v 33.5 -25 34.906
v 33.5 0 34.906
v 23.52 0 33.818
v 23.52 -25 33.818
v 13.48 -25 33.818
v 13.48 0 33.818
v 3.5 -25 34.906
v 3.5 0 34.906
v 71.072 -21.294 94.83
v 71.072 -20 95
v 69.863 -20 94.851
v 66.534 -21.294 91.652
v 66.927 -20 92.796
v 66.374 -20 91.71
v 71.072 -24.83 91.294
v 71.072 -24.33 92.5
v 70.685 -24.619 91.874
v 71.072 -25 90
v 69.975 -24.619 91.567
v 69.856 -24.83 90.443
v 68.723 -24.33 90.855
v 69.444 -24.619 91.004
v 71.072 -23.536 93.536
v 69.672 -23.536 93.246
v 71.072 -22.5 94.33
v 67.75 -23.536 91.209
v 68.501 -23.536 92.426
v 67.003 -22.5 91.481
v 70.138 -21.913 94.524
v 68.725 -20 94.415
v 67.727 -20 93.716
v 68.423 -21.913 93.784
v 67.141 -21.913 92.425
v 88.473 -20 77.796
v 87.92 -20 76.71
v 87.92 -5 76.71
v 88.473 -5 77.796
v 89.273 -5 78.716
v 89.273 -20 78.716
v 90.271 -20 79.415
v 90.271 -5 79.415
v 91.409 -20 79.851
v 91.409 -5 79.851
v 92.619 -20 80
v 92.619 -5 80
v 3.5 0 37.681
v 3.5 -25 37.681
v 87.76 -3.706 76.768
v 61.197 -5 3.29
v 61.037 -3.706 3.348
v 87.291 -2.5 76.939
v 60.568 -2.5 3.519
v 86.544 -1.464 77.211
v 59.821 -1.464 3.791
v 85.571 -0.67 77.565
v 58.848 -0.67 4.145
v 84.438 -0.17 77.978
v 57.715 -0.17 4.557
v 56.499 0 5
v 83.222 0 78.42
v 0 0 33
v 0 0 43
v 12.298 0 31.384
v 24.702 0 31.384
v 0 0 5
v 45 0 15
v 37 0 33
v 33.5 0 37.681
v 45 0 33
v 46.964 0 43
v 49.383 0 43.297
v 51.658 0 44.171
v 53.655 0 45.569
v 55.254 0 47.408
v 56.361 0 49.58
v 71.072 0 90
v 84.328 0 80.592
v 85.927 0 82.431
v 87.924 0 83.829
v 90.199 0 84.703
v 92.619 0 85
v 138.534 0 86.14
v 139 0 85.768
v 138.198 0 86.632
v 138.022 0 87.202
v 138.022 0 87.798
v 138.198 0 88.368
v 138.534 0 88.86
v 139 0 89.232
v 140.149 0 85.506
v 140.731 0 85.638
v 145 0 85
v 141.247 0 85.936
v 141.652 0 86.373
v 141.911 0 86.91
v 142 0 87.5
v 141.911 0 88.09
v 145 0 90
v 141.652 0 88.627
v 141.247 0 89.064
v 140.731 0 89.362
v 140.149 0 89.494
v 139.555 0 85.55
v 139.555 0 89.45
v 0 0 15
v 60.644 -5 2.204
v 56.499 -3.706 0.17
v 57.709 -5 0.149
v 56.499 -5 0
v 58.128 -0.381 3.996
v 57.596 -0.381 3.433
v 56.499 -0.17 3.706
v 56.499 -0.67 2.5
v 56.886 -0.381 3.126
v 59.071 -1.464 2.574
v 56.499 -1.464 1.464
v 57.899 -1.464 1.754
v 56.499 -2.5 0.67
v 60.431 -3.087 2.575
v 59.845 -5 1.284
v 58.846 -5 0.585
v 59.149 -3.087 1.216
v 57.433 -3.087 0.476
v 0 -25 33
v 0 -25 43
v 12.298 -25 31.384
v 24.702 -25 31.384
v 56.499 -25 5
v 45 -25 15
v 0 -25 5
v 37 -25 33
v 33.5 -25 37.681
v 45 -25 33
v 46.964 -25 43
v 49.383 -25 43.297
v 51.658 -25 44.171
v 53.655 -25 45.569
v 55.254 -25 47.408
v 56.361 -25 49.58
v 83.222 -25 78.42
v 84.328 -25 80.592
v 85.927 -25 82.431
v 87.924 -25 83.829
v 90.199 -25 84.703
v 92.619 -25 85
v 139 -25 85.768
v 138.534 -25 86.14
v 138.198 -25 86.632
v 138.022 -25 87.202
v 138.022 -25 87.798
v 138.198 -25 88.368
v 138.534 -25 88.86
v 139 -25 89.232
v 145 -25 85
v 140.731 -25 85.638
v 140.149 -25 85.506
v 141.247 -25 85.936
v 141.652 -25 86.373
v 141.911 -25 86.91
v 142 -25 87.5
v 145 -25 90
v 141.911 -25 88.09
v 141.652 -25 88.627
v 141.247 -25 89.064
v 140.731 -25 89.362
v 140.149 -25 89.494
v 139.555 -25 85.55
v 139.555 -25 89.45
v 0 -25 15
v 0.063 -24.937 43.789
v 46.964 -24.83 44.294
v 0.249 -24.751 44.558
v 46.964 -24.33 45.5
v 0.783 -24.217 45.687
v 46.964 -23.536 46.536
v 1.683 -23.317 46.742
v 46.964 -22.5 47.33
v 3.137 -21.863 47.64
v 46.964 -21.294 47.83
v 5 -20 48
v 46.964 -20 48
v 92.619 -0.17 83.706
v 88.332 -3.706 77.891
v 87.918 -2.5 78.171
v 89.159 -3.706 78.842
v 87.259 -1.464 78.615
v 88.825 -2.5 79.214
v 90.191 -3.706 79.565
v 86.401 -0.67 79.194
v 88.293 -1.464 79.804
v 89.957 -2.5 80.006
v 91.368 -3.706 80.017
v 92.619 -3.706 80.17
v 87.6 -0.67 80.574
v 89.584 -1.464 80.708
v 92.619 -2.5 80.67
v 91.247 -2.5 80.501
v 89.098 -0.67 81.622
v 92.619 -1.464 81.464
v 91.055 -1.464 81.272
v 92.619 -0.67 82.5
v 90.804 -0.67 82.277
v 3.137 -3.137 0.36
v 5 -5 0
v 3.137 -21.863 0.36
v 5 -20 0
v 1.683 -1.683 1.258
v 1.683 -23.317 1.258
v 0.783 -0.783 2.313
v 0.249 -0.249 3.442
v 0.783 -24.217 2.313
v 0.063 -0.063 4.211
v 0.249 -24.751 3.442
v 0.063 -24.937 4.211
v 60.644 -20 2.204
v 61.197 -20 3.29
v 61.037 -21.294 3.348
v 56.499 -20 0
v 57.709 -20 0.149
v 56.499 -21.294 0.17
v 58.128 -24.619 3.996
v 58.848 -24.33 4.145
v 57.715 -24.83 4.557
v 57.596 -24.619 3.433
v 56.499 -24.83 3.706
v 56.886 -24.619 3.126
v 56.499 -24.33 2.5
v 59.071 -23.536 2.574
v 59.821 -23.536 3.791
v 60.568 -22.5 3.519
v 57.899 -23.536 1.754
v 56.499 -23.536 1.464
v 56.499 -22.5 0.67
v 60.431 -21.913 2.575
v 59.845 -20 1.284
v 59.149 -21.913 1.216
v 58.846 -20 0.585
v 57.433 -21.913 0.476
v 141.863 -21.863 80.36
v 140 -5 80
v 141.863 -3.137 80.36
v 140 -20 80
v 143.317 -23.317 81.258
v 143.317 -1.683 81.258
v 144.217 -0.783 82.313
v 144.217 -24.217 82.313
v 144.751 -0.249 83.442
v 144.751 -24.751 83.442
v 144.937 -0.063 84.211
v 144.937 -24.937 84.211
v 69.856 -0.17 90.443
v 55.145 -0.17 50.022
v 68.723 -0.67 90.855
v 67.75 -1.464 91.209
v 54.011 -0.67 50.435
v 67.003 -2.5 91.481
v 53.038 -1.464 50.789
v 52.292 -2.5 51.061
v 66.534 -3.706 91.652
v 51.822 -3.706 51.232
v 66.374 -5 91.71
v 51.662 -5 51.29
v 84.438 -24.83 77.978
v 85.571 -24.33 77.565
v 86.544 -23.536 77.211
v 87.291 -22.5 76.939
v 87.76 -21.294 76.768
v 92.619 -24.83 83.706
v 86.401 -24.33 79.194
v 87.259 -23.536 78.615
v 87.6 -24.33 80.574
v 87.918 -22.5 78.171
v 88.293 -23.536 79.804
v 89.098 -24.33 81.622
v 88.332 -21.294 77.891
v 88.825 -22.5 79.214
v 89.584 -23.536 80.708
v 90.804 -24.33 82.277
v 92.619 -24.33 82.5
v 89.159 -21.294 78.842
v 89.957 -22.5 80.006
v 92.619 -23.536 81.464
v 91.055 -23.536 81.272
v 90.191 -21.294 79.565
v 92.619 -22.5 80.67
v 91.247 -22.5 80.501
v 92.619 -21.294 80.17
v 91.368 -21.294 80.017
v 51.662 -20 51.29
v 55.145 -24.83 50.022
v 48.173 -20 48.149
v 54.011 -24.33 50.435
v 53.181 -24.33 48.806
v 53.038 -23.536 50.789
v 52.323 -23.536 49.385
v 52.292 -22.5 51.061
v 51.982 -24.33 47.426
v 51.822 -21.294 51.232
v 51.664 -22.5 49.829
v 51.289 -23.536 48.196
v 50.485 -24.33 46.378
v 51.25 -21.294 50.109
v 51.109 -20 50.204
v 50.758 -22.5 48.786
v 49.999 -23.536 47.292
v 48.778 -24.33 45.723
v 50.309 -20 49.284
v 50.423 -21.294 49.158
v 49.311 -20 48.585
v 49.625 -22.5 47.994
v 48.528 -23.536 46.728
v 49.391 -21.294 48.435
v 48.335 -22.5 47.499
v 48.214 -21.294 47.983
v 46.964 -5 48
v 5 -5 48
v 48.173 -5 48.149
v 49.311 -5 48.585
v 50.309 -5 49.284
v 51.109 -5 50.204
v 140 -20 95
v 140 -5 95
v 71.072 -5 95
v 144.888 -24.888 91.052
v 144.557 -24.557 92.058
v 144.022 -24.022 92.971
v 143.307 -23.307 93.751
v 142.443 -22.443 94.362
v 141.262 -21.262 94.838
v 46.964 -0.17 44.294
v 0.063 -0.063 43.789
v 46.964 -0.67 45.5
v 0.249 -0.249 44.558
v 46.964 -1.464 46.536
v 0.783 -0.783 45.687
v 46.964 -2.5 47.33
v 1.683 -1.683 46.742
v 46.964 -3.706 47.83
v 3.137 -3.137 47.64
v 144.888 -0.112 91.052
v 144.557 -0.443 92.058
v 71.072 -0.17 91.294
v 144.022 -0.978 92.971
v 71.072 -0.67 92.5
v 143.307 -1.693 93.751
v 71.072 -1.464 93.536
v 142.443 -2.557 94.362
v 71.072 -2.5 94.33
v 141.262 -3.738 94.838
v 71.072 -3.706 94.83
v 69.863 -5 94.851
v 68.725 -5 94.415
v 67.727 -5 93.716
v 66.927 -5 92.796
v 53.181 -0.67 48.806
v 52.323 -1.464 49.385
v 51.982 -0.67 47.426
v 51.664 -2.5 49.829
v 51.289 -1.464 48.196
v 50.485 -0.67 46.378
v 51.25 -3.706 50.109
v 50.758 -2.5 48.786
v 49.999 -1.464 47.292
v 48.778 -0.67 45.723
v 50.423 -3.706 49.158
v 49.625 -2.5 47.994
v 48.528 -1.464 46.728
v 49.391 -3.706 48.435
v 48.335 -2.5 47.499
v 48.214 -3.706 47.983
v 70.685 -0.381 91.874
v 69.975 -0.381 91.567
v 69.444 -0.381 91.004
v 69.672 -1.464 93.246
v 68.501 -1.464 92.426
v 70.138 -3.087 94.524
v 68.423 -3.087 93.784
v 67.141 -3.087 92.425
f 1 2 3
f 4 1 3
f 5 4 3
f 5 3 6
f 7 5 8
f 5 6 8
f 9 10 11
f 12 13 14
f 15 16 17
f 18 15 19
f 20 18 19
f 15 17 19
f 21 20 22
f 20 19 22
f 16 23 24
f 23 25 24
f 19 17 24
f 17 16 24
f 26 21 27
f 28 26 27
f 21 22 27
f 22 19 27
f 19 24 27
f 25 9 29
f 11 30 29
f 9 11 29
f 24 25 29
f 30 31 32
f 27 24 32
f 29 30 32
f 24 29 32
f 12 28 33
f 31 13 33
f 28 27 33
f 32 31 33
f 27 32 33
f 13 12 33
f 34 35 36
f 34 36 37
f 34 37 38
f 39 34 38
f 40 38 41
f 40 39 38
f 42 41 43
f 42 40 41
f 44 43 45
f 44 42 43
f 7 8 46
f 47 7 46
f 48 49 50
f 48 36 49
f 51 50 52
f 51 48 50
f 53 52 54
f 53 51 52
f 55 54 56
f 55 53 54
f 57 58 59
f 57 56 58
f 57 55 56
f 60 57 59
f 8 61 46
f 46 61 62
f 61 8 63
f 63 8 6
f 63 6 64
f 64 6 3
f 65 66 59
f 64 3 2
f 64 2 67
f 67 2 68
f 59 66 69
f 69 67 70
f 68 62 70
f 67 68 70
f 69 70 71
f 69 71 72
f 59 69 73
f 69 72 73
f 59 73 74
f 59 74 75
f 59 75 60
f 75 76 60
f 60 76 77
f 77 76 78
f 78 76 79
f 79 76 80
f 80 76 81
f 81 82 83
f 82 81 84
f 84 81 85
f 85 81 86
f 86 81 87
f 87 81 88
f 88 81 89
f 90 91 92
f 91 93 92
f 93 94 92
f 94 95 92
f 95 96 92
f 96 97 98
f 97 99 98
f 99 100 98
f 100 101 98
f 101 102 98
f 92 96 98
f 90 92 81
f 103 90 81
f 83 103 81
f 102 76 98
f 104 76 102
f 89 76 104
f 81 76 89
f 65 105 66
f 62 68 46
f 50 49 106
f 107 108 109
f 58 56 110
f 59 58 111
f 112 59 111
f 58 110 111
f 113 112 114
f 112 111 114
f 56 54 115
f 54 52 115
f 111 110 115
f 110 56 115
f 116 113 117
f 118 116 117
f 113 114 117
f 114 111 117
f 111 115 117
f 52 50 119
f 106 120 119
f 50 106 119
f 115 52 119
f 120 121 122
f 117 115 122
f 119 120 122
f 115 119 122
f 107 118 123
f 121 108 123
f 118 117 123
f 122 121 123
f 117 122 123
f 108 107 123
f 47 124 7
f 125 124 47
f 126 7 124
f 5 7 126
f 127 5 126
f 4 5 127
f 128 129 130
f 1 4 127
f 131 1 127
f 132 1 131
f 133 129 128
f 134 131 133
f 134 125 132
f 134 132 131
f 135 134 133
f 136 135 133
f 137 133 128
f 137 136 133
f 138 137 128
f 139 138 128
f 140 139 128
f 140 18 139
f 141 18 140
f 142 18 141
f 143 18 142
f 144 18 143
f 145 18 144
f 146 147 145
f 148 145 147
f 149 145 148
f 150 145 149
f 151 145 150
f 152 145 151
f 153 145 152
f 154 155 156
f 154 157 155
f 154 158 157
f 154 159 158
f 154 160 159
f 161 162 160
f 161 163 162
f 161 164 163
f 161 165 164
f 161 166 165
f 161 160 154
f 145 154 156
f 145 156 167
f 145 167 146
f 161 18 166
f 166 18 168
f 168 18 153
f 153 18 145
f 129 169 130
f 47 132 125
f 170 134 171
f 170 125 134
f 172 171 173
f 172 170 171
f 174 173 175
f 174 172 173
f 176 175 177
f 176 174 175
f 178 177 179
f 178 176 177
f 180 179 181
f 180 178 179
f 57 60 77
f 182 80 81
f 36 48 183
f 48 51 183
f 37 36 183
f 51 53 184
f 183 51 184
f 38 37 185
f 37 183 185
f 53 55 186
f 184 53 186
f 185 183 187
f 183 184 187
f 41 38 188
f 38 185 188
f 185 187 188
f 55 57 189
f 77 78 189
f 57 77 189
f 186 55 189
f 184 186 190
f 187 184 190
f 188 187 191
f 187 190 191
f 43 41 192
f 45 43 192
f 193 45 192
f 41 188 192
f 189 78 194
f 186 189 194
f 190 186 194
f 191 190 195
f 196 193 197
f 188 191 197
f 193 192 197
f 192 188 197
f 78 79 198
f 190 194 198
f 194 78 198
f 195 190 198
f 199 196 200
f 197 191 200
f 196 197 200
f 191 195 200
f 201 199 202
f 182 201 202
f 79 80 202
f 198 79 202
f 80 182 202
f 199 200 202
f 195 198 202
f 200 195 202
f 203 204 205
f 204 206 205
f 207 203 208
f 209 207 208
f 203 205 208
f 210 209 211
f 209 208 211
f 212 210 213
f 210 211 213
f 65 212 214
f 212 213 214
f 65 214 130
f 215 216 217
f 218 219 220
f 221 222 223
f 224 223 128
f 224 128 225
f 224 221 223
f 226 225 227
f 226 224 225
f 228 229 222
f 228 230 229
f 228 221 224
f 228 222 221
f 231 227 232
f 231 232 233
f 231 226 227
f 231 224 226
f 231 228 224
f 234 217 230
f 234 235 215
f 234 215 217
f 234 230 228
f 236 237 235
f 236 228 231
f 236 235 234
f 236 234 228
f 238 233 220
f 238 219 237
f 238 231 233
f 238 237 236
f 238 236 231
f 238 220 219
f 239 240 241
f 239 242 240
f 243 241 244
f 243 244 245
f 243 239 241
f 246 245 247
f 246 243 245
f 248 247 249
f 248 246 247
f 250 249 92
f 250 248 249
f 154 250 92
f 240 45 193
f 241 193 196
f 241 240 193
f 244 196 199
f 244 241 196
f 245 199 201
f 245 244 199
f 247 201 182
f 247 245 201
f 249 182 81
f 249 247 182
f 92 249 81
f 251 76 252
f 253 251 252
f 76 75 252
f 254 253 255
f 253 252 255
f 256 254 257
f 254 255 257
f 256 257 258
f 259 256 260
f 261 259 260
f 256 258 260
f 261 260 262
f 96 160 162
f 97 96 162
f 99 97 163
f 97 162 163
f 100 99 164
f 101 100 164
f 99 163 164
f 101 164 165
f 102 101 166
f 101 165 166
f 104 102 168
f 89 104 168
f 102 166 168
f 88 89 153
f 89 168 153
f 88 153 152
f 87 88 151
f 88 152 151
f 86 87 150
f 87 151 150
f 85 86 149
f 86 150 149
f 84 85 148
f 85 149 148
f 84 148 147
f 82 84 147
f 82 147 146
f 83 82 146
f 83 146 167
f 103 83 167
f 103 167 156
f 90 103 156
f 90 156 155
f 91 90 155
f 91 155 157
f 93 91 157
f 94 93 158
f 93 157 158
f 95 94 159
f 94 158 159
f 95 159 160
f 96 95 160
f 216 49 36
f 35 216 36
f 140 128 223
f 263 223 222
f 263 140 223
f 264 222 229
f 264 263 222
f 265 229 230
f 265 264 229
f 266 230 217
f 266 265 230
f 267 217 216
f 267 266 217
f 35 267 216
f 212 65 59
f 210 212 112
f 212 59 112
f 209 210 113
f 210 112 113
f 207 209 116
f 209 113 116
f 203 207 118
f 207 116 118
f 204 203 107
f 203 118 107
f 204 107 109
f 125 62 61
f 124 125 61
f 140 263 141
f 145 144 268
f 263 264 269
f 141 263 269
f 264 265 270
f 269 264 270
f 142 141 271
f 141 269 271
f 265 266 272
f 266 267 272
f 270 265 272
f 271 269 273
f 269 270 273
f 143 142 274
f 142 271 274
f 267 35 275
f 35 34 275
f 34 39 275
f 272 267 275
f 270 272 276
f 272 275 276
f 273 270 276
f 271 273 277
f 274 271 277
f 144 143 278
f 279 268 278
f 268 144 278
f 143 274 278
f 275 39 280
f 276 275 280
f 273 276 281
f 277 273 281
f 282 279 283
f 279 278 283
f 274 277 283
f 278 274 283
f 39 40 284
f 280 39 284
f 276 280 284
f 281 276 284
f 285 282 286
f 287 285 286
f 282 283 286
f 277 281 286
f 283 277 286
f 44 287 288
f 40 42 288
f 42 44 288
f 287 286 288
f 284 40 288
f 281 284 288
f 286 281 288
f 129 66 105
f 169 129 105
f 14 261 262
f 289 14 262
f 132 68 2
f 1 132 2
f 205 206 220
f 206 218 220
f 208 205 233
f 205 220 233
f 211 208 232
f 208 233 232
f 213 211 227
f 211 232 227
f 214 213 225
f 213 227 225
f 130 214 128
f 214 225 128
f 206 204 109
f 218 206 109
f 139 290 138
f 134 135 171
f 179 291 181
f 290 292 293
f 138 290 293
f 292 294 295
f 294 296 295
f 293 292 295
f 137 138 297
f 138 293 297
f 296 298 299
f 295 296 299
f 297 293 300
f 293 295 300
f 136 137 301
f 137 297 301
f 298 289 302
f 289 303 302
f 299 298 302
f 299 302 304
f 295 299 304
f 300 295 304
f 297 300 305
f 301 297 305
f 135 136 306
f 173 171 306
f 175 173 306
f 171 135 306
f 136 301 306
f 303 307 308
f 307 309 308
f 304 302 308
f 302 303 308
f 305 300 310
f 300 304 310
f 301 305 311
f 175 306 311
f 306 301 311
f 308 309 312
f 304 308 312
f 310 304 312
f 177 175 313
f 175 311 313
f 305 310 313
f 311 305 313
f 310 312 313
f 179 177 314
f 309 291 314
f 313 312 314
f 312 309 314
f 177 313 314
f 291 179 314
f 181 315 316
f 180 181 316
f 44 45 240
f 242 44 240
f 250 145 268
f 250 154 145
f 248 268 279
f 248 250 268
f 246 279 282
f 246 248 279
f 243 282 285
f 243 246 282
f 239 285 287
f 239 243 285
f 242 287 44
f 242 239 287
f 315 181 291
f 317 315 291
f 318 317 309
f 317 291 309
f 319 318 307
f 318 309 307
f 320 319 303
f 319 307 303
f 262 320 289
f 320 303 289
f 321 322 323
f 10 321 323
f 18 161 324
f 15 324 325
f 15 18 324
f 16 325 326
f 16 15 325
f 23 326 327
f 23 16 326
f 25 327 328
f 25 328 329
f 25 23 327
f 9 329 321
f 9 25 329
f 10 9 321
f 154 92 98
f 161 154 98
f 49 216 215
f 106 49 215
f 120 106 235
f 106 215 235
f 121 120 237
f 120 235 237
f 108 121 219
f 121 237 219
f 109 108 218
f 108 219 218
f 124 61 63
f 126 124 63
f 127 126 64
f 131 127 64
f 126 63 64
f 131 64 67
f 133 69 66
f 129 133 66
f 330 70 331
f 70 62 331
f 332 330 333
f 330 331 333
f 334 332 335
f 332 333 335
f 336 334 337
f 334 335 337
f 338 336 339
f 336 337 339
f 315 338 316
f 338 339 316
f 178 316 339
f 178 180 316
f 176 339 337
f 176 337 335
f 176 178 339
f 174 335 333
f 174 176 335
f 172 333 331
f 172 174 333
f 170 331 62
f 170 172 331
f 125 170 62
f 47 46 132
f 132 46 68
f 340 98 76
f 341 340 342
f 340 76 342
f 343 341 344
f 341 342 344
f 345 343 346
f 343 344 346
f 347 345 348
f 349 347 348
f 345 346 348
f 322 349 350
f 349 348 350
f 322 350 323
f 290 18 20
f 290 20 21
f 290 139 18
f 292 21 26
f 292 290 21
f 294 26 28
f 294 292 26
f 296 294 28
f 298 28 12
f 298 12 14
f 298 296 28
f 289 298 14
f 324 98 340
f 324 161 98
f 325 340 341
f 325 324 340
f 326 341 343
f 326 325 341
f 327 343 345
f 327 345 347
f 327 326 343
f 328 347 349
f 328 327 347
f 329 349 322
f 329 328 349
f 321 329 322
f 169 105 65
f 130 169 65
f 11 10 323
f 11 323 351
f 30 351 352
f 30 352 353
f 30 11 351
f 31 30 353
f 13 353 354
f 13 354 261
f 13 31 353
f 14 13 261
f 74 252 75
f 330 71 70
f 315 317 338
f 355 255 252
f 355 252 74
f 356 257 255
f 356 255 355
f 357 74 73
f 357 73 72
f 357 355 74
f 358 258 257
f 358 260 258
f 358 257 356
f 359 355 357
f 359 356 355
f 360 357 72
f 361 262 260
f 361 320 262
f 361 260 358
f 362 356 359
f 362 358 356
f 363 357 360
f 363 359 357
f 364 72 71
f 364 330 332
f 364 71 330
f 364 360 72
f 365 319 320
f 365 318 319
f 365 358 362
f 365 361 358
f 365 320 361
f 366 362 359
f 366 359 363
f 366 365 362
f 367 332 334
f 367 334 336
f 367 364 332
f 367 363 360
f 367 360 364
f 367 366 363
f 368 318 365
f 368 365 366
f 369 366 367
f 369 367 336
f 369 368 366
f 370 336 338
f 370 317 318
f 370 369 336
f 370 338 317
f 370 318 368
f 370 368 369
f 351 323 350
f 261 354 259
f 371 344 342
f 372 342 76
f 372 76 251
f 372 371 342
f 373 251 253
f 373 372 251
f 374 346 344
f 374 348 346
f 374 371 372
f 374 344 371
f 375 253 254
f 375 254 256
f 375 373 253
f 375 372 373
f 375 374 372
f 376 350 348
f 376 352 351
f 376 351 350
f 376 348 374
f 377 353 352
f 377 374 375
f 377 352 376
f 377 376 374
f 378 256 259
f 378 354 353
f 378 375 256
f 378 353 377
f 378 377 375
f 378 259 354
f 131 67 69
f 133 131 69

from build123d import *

# Parameters (mm, degrees)
F1_DEPTH = 25
F2_F1_R  = 5
F2_F2_R  = 5
F3_R     = 2
F4_DEPTH = 25


with BuildPart() as f1:
    # F0 (on Front) → F1 (new body)
    with BuildSketch(Plane.XZ):
        with BuildLine():
            Line((45, 15), (0, 15))
            Line((0, 15), (0, 0))
            Line((0, 0), (60, 0))
            Line((60, 0), (89.1176187413, 80))
            Line((89.1176187413, 80), (145, 80))
            Line((145, 80), (145, 95))
            Line((145, 95), (67.5712870168, 95))
            Line((67.5712870168, 95), (50.4646860063, 48))
            Line((50.4646860063, 48), (0, 48))
            Line((0, 48), (0, 33))
            ThreePointArc((0, 33), (18.5, 31.181274943), (37, 33))
            Line((37, 33), (45, 33))
            Line((45, 33), (45, 15))
        make_face()
        with BuildLine():
            ThreePointArc((33.5, 34.9055936253), (18.5, 33.681274943), (3.5, 34.9055936253))
            Line((3.5, 34.9055936253), (3.5, 37.681274943))
            Line((3.5, 37.681274943), (33.5, 37.681274943))
            Line((33.5, 37.681274943), (33.5, 34.9055936253))
        make_face(mode=Mode.SUBTRACT)
    extrude(amount=F1_DEPTH)

    # F2: fillet of radius 5 on 16 edges, made by hand

    # F2_f1
    f2_f1_edges = [f1.edges().sort_by_distance(p)[0] for p in [
        (89.1176187413, -12.5, 80),
        (50.4646860063, -12.5, 48),
    ]]
    fillet(f2_f1_edges, radius=F2_F1_R)

    # F2_f2
    f2_f2_edges = [f1.edges().sort_by_distance(p)[0] for p in [
        (60, -12.5, 0),
        (67.5712870168, -12.5, 95),
        (145, -12.5, 95),
        (145, -12.5, 80),
        (0, -12.5, 48),
        (0, -12.5, 0),
        (118.8093282162, -25, 80),
        (73.9600966642, 0, 38.3550503583),
        (106.2856435084, -25, 95),
        (59.616699218, -25, 73.1449496417),
        (106.2856435084, 0, 95),
        (59.616699218, 0, 73.1449496417),
        (30, -25, 0),
        (30, 0, 0),
        (49.831530497, 0, 48.9042397786),
        (49.831530497, -25, 48.9042397786),
        (89.7507742506, 0, 79.0957602214),
        (89.7507742506, -25, 79.0957602214),
    ]]
    fillet(f2_f2_edges, radius=F2_F2_R)

    # F3 (on face) → F4 (cut)
    with BuildSketch(Plane.XZ.offset(25)):
        with Locations((140, 87.5)):
            Circle(F3_R)
    extrude(amount=-F4_DEPTH, mode=Mode.SUBTRACT)


solid = f1.part
